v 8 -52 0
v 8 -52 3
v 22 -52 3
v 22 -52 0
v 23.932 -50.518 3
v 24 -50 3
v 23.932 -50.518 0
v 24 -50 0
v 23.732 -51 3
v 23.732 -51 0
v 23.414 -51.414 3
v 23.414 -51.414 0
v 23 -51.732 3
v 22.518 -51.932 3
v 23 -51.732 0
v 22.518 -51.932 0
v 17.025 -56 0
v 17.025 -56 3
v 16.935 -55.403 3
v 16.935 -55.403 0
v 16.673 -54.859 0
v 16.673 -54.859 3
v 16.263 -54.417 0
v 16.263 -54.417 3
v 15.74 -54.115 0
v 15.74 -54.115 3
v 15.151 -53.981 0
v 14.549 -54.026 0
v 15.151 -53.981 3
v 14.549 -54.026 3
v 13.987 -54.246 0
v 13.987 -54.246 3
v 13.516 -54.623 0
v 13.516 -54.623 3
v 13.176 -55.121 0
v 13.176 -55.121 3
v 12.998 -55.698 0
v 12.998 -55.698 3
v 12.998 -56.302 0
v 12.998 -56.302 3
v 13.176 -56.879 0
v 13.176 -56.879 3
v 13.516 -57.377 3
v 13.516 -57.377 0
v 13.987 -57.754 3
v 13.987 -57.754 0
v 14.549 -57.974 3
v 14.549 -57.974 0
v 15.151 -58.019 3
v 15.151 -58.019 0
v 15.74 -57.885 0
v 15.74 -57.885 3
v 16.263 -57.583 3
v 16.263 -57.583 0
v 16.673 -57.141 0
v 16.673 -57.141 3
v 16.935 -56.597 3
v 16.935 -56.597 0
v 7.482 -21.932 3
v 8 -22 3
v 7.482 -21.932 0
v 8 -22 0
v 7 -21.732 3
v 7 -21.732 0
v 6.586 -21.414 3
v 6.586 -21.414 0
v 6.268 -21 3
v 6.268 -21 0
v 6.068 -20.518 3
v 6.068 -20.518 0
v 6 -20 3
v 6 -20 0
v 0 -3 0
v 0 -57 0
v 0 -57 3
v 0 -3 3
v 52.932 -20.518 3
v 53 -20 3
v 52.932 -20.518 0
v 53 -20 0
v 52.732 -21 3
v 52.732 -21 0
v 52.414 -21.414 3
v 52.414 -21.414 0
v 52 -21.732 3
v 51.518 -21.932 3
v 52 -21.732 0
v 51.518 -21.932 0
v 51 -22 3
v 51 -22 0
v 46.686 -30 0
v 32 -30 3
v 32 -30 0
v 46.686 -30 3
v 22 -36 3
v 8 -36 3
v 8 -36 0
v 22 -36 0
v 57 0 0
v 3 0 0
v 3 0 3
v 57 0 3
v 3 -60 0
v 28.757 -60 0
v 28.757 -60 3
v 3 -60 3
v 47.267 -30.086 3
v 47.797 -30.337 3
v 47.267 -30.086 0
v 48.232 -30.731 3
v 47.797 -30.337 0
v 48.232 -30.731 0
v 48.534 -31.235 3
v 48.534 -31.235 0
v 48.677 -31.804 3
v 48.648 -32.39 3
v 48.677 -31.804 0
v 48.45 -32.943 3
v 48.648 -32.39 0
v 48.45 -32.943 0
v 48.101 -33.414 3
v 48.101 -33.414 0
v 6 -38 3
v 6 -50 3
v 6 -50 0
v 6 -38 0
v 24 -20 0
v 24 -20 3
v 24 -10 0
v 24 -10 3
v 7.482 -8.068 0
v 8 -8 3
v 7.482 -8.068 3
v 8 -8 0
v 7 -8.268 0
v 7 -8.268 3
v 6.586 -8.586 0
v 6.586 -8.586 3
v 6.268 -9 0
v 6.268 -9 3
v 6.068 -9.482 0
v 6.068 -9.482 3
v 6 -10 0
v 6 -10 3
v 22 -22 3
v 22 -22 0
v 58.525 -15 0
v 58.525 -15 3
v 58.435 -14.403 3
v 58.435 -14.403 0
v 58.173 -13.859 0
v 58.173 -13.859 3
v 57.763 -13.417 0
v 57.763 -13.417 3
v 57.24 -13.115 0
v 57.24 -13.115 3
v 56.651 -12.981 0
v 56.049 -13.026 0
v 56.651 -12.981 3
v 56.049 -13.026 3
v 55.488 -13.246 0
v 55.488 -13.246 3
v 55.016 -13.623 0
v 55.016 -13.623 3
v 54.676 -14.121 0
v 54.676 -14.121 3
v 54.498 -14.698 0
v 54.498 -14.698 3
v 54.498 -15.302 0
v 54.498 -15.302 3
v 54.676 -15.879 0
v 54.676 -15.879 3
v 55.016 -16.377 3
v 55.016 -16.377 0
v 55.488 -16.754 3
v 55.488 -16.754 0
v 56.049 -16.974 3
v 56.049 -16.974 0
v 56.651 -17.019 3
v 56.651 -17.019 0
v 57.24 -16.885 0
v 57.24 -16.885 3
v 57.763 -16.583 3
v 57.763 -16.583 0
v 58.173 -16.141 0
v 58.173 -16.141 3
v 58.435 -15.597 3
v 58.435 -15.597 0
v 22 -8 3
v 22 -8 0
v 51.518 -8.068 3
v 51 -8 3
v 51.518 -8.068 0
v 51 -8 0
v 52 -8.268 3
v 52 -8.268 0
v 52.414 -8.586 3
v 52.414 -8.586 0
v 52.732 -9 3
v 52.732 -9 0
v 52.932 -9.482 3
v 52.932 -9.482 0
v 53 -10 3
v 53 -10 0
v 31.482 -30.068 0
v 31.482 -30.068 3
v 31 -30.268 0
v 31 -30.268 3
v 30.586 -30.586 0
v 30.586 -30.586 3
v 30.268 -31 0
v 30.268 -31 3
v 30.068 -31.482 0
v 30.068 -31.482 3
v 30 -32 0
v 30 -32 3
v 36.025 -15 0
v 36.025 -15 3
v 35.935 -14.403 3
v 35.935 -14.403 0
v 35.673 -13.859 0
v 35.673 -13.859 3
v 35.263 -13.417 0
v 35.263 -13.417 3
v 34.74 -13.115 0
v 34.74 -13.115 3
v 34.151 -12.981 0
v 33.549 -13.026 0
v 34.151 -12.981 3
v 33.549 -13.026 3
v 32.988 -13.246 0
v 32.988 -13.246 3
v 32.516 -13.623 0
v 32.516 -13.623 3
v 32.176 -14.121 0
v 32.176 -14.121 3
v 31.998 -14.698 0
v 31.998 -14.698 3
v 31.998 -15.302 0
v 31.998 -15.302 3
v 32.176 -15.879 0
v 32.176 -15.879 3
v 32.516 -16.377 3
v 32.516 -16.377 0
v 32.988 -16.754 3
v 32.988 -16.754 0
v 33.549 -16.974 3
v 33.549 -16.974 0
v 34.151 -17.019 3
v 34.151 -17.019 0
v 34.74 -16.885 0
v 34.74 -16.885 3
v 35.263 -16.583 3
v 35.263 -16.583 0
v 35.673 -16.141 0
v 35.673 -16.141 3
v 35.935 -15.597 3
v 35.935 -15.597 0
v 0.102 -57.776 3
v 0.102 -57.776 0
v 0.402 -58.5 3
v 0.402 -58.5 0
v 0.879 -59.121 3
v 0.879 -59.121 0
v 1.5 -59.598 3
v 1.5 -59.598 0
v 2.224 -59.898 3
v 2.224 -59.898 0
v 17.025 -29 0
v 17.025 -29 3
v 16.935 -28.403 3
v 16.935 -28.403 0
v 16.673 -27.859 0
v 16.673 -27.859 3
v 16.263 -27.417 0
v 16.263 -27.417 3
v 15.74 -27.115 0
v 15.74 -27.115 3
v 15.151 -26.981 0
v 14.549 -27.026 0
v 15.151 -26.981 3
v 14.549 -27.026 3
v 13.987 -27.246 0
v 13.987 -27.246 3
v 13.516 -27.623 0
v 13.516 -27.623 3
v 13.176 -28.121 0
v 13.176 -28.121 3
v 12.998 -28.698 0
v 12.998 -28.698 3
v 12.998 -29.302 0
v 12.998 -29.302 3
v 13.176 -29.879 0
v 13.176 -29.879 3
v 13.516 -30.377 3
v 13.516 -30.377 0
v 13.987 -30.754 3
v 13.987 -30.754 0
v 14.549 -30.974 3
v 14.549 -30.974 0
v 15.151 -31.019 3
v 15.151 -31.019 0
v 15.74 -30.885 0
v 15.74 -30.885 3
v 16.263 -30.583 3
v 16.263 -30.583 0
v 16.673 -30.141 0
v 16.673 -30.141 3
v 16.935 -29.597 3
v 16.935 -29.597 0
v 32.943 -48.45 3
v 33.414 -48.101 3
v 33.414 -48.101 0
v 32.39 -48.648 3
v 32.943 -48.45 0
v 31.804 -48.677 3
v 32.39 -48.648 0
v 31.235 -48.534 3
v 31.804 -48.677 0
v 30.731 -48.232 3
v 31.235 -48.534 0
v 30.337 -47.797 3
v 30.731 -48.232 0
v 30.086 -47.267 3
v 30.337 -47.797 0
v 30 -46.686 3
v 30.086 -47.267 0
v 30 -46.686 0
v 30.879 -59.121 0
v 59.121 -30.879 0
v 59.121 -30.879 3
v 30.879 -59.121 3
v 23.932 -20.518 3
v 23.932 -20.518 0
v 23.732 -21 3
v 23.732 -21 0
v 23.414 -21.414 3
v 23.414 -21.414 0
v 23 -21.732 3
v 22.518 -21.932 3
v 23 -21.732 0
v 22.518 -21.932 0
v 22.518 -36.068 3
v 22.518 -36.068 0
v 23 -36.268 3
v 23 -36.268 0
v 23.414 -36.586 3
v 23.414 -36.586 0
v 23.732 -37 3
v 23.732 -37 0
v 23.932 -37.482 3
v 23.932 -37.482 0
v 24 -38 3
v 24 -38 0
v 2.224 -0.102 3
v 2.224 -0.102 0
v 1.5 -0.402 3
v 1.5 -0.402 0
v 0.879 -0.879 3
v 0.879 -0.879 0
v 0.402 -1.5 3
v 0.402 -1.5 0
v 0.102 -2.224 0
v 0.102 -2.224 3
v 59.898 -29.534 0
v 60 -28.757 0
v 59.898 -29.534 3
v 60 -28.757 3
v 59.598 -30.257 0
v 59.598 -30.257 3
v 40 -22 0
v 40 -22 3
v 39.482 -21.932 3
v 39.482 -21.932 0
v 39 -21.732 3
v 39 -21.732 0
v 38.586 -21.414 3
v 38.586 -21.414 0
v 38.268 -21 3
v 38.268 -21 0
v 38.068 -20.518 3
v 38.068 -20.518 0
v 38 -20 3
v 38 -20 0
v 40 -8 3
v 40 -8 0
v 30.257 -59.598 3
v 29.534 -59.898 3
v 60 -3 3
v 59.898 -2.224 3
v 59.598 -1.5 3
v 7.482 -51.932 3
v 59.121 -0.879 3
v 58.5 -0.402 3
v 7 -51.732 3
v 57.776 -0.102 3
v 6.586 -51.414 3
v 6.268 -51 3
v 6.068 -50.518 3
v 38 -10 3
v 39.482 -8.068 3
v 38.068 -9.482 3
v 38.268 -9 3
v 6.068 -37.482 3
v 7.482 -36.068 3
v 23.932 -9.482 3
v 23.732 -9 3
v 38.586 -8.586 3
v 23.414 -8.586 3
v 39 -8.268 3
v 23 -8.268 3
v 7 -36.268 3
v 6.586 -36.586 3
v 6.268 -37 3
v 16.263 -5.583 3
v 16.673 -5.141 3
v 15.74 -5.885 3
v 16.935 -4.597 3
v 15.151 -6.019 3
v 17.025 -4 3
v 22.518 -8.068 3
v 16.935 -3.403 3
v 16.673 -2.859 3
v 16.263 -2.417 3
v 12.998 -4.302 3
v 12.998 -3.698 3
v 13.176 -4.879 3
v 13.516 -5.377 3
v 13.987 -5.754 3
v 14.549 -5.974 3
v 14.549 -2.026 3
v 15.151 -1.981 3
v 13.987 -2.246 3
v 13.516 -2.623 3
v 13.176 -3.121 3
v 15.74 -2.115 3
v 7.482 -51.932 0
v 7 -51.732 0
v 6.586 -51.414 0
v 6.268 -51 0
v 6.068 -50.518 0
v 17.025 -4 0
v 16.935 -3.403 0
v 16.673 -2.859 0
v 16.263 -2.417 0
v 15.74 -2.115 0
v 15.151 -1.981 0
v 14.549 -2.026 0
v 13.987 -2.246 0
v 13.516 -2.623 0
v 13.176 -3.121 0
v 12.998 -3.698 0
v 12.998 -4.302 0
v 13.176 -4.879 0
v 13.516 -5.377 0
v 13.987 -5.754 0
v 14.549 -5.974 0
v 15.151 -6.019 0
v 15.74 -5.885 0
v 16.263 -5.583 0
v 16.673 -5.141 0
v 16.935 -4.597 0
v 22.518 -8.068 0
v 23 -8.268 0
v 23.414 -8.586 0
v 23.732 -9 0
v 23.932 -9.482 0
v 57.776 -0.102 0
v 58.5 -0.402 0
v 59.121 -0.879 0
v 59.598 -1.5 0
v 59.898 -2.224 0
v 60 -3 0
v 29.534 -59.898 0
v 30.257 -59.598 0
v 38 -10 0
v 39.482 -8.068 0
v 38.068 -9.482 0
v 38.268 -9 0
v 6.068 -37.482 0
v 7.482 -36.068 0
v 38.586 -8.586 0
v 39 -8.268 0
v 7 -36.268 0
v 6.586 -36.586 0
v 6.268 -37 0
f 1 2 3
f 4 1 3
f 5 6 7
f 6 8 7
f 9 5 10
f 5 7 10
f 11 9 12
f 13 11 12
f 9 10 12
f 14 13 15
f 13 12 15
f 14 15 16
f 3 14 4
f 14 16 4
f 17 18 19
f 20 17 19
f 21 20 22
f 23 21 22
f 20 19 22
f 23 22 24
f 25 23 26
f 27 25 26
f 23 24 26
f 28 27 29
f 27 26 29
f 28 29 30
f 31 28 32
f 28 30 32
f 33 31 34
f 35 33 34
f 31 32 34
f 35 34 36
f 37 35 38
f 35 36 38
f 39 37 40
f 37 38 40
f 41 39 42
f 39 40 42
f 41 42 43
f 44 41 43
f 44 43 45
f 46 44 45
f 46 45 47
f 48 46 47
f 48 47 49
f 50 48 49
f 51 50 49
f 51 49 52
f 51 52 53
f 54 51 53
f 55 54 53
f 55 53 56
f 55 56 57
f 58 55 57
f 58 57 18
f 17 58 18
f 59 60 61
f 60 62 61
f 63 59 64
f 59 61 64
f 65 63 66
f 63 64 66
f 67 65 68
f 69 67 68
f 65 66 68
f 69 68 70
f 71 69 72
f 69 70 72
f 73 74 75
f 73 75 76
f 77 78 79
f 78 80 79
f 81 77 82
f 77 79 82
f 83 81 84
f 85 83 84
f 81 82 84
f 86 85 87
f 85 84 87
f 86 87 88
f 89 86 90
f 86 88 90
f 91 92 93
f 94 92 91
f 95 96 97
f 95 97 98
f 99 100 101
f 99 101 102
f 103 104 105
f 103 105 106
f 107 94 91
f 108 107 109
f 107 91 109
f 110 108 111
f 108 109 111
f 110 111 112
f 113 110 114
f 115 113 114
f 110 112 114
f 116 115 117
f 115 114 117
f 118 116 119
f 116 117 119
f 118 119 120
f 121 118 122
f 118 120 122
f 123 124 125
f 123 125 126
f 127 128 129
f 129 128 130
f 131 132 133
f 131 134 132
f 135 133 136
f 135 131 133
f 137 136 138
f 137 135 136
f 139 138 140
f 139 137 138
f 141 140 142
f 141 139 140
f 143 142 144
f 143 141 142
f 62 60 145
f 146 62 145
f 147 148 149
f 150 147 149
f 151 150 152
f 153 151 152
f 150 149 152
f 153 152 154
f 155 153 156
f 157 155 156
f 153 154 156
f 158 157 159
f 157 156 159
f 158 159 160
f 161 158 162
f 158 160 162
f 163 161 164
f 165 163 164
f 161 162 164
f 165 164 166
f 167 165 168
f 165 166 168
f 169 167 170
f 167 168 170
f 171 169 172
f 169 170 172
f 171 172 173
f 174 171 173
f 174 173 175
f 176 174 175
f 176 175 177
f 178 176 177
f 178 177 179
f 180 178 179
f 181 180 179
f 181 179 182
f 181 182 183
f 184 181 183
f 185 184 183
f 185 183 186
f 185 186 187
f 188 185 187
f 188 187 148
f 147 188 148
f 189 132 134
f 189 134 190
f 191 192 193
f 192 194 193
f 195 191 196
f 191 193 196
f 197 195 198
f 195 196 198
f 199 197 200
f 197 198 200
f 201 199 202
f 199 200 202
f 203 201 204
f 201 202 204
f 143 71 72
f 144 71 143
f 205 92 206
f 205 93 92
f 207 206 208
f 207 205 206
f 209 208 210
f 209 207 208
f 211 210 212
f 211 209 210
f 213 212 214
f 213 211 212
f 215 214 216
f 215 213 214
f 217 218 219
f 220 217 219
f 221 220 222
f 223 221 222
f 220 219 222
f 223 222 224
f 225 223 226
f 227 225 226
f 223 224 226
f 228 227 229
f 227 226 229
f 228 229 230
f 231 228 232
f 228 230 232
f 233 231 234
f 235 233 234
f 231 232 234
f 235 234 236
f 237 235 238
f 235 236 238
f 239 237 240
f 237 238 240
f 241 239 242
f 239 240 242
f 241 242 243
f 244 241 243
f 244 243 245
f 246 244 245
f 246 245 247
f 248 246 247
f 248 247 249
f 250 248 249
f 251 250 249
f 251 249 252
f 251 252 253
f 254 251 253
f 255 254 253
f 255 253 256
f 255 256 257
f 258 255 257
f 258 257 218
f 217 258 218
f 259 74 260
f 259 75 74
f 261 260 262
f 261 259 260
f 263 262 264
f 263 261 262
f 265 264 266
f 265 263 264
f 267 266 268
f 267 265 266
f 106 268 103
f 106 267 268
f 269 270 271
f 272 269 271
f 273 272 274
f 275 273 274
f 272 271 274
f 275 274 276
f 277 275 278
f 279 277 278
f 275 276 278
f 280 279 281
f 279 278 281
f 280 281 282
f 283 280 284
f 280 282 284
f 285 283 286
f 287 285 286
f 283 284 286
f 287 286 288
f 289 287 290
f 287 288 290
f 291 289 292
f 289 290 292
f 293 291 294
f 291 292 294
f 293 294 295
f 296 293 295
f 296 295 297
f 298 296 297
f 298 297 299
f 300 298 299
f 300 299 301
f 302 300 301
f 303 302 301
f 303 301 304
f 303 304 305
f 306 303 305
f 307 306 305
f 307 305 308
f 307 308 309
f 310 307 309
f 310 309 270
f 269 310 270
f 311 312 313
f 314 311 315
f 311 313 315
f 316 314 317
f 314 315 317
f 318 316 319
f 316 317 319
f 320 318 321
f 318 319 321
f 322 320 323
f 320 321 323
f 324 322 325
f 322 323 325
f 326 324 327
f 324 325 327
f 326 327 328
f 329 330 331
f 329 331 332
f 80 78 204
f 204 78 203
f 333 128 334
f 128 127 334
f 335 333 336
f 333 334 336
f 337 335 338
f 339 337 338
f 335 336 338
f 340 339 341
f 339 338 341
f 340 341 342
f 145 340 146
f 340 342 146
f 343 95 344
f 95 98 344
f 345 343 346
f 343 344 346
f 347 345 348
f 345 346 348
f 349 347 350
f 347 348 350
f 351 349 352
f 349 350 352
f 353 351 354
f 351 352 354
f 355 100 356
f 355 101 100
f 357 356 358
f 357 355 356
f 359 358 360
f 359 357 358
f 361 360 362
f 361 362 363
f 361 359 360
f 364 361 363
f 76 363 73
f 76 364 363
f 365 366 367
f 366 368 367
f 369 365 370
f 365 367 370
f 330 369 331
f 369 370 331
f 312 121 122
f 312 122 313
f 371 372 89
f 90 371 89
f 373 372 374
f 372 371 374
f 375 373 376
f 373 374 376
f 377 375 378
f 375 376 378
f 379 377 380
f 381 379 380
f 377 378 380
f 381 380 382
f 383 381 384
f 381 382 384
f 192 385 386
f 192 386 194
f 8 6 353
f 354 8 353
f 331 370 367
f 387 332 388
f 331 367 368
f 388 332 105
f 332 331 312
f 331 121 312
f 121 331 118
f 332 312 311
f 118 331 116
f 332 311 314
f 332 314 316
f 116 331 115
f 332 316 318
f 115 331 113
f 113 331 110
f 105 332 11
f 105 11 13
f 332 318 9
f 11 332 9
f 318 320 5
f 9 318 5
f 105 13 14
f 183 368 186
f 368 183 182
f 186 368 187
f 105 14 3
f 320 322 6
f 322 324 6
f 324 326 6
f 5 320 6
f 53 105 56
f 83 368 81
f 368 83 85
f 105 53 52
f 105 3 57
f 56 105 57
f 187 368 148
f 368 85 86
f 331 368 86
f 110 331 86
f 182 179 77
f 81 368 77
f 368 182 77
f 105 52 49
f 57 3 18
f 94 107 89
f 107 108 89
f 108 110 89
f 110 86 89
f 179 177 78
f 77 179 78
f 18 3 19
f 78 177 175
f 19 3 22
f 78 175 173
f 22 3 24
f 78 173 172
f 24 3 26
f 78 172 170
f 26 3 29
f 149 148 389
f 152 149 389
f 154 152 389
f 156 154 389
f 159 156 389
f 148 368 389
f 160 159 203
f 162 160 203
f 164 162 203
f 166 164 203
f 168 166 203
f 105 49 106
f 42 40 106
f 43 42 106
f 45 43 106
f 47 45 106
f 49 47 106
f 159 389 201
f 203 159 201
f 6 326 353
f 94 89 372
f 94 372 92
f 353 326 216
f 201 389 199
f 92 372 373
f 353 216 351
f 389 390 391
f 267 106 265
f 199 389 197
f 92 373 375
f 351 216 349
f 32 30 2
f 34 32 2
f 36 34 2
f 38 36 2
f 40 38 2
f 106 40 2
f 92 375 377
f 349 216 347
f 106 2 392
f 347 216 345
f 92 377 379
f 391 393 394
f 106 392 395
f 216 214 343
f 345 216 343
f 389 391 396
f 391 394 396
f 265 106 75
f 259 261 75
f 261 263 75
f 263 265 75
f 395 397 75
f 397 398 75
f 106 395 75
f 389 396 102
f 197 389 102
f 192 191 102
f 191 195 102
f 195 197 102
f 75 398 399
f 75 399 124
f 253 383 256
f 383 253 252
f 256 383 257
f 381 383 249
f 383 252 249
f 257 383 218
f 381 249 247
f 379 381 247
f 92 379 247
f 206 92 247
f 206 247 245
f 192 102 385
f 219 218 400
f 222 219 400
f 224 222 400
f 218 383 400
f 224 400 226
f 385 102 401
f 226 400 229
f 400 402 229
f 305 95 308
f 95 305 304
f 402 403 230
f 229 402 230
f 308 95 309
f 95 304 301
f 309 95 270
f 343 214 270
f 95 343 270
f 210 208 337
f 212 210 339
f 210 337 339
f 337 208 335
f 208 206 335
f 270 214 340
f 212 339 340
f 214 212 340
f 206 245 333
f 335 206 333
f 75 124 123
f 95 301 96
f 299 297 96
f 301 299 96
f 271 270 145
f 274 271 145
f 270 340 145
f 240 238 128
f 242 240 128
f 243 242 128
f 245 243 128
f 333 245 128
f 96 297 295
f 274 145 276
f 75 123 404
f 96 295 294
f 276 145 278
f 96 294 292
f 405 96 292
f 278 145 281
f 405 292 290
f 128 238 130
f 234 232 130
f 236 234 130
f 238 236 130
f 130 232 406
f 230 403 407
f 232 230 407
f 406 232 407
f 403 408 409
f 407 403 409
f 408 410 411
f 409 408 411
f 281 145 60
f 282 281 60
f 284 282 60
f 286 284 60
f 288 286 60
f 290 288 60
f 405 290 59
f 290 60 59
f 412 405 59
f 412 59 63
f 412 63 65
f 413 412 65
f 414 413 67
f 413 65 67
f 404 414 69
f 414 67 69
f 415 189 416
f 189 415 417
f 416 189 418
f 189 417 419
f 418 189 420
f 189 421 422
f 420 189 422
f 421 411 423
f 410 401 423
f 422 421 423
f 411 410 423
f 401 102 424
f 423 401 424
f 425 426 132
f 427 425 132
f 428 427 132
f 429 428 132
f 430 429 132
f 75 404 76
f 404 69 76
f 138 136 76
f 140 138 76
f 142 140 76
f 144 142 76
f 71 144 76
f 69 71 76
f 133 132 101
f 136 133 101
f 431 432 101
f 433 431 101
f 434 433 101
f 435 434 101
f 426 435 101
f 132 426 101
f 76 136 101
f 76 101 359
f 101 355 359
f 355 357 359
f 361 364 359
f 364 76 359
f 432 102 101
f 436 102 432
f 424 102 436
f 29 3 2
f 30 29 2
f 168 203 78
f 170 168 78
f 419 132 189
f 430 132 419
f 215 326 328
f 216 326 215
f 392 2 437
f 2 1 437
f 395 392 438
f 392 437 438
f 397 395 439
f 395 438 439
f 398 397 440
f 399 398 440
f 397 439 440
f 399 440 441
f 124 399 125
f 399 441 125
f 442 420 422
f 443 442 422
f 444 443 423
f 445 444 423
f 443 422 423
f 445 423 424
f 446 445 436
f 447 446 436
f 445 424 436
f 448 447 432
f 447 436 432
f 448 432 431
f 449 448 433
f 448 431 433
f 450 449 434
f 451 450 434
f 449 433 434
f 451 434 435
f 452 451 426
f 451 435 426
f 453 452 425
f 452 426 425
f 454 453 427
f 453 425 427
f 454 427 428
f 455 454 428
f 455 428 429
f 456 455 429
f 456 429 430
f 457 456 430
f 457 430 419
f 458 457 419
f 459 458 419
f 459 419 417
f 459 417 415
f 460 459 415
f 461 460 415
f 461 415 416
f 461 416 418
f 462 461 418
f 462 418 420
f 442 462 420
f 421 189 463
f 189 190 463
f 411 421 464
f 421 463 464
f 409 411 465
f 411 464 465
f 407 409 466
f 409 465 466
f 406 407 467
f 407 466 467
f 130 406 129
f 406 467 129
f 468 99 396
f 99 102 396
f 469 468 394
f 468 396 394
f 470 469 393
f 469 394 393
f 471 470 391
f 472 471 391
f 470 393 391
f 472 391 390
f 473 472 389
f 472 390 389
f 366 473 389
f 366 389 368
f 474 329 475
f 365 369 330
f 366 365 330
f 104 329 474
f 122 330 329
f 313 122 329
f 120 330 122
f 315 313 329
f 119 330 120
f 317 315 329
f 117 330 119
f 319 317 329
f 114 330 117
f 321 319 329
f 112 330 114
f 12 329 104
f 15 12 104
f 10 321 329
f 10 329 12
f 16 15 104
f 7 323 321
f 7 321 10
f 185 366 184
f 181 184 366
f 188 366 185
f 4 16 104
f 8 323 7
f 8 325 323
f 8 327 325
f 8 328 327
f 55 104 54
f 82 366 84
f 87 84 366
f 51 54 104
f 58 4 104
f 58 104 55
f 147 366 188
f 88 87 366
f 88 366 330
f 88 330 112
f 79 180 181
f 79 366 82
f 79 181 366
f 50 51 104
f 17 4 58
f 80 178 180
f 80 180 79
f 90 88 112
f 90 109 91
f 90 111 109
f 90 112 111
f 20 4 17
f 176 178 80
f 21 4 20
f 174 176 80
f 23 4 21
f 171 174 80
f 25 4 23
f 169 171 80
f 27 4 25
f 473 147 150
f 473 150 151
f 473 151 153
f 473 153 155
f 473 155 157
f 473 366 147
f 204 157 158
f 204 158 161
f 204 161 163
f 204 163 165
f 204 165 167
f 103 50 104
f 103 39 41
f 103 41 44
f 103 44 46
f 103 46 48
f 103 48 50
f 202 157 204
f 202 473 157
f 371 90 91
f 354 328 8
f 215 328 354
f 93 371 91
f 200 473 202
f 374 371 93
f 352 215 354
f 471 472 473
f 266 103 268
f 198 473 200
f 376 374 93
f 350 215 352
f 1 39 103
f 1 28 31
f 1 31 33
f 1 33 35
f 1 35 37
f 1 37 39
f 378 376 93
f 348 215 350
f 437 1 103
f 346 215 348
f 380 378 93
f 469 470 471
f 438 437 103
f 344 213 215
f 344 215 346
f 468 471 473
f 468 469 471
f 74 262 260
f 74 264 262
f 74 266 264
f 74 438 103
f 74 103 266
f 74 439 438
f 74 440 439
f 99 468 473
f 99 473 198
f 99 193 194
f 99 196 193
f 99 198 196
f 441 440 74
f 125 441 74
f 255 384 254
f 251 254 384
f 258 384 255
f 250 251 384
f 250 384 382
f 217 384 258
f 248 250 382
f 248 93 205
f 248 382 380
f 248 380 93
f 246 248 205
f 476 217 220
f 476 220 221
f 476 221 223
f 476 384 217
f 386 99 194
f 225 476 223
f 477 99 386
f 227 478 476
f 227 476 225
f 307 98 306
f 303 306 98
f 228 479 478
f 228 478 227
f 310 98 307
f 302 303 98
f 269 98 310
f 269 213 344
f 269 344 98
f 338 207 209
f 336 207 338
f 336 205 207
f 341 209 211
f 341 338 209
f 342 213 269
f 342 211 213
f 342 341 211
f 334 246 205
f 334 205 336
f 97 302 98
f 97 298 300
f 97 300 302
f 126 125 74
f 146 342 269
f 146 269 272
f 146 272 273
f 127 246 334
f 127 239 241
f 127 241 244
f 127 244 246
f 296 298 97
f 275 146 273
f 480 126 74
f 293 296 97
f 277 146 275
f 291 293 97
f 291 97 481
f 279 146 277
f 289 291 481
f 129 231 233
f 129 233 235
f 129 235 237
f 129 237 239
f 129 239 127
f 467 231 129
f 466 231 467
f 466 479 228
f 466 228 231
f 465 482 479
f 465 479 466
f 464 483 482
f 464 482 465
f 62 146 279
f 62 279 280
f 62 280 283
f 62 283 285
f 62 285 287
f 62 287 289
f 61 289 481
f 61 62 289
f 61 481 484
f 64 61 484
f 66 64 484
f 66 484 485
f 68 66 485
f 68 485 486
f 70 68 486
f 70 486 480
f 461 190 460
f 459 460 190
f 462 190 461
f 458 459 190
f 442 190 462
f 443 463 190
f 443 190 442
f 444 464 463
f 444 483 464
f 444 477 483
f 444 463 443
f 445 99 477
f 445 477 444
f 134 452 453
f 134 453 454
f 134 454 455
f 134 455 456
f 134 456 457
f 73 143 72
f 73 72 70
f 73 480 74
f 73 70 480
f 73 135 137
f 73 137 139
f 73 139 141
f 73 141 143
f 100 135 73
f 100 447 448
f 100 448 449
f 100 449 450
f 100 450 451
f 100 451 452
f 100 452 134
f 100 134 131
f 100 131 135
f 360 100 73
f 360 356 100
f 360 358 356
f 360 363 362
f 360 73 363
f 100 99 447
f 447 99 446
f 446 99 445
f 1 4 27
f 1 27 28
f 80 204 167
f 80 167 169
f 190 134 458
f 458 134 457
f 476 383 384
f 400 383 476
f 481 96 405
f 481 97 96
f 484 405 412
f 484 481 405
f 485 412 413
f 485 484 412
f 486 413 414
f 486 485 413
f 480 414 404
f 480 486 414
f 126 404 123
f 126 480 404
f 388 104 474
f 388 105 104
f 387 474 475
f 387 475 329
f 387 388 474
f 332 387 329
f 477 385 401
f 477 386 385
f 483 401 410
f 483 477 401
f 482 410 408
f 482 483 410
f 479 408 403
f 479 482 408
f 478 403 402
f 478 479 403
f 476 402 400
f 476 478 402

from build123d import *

# Parameters (mm, degrees)
EXTRUDE_1_DEPTH     = 3
SKETCH_2_W          = 18
SKETCH_2_H          = 14
SKETCH_2_H_2        = 16
SKETCH_2_W_2        = 15
CUT_EXTRUDE_1_DEPTH = 10
FILLET_1_R          = 2
FILLET_2_R          = 3
SKETCH_4_R          = 2.025
CUT_EXTRUDE_2_DEPTH = 10
SKETCH_5_R          = 2.025
CUT_EXTRUDE_3_DEPTH = 10


with BuildPart() as part:
    # 草图1 → 凸台-拉伸1 (new body)
    with BuildSketch(Plane.XY):
        Polygon((0, 0), (60, 0), (60, -30), (30, -60), (0, -60), align=None)
    extrude(amount=EXTRUDE_1_DEPTH)

    # 草图2 → 切除-拉伸1 (cut)
    with BuildSketch(Plane.XY.offset(3)):
        Polygon((30, -51.514718626), (30, -30), (51.514718626, -30), align=None)
        with Locations((15, -15)):
            Rectangle(SKETCH_2_W, SKETCH_2_H)
        with Locations((15, -44)):
            Rectangle(SKETCH_2_W, SKETCH_2_H_2)
        with Locations((45.5, -15)):
            Rectangle(SKETCH_2_W_2, SKETCH_2_H)
    extrude(amount=-CUT_EXTRUDE_1_DEPTH, mode=Mode.SUBTRACT)

    # 圆角1
    fillet_1_edges = [part.edges().sort_by_distance(p)[0] for p in [
        (53, -8, 1.5),
        (53, -22, 1.5),
        (38, -22, 1.5),
        (38, -8, 1.5),
        (51.514718626, -30, 1.5),
        (30, -51.514718626, 1.5),
        (30, -30, 1.5),
        (24, -36, 1.5),
        (24, -52, 1.5),
        (6, -52, 1.5),
        (6, -36, 1.5),
        (24, -8, 1.5),
        (24, -22, 1.5),
        (6, -22, 1.5),
        (6, -8, 1.5),
    ]]
    fillet(fillet_1_edges, radius=FILLET_1_R)

    # 圆角2
    fillet_2_edges = [part.edges().sort_by_distance(p)[0] for p in [
        (0, 0, 1.5),
        (60, 0, 1.5),
        (60, -30, 1.5),
        (30, -60, 1.5),
        (0, -60, 1.5),
    ]]
    fillet(fillet_2_edges, radius=FILLET_2_R)

    # 草图4 → 切除-拉伸2 (cut)
    with BuildSketch(Plane.XY.offset(3)):
        with Locations((15, -29)):
            Circle(SKETCH_4_R)
        with Locations((15, -56)):
            Circle(SKETCH_4_R)
        with Locations((15, -4)):
            Circle(SKETCH_4_R)
    extrude(amount=-CUT_EXTRUDE_2_DEPTH, mode=Mode.SUBTRACT)

    # 草图5 → 切除-拉伸3 (cut)
    with BuildSketch(Plane.XY.offset(3)):
        with Locations((34, -15)):
            Circle(SKETCH_5_R)
        with Locations((56.5, -15)):
            Circle(SKETCH_5_R)
    extrude(amount=-CUT_EXTRUDE_3_DEPTH, mode=Mode.SUBTRACT)


solid = part.part
